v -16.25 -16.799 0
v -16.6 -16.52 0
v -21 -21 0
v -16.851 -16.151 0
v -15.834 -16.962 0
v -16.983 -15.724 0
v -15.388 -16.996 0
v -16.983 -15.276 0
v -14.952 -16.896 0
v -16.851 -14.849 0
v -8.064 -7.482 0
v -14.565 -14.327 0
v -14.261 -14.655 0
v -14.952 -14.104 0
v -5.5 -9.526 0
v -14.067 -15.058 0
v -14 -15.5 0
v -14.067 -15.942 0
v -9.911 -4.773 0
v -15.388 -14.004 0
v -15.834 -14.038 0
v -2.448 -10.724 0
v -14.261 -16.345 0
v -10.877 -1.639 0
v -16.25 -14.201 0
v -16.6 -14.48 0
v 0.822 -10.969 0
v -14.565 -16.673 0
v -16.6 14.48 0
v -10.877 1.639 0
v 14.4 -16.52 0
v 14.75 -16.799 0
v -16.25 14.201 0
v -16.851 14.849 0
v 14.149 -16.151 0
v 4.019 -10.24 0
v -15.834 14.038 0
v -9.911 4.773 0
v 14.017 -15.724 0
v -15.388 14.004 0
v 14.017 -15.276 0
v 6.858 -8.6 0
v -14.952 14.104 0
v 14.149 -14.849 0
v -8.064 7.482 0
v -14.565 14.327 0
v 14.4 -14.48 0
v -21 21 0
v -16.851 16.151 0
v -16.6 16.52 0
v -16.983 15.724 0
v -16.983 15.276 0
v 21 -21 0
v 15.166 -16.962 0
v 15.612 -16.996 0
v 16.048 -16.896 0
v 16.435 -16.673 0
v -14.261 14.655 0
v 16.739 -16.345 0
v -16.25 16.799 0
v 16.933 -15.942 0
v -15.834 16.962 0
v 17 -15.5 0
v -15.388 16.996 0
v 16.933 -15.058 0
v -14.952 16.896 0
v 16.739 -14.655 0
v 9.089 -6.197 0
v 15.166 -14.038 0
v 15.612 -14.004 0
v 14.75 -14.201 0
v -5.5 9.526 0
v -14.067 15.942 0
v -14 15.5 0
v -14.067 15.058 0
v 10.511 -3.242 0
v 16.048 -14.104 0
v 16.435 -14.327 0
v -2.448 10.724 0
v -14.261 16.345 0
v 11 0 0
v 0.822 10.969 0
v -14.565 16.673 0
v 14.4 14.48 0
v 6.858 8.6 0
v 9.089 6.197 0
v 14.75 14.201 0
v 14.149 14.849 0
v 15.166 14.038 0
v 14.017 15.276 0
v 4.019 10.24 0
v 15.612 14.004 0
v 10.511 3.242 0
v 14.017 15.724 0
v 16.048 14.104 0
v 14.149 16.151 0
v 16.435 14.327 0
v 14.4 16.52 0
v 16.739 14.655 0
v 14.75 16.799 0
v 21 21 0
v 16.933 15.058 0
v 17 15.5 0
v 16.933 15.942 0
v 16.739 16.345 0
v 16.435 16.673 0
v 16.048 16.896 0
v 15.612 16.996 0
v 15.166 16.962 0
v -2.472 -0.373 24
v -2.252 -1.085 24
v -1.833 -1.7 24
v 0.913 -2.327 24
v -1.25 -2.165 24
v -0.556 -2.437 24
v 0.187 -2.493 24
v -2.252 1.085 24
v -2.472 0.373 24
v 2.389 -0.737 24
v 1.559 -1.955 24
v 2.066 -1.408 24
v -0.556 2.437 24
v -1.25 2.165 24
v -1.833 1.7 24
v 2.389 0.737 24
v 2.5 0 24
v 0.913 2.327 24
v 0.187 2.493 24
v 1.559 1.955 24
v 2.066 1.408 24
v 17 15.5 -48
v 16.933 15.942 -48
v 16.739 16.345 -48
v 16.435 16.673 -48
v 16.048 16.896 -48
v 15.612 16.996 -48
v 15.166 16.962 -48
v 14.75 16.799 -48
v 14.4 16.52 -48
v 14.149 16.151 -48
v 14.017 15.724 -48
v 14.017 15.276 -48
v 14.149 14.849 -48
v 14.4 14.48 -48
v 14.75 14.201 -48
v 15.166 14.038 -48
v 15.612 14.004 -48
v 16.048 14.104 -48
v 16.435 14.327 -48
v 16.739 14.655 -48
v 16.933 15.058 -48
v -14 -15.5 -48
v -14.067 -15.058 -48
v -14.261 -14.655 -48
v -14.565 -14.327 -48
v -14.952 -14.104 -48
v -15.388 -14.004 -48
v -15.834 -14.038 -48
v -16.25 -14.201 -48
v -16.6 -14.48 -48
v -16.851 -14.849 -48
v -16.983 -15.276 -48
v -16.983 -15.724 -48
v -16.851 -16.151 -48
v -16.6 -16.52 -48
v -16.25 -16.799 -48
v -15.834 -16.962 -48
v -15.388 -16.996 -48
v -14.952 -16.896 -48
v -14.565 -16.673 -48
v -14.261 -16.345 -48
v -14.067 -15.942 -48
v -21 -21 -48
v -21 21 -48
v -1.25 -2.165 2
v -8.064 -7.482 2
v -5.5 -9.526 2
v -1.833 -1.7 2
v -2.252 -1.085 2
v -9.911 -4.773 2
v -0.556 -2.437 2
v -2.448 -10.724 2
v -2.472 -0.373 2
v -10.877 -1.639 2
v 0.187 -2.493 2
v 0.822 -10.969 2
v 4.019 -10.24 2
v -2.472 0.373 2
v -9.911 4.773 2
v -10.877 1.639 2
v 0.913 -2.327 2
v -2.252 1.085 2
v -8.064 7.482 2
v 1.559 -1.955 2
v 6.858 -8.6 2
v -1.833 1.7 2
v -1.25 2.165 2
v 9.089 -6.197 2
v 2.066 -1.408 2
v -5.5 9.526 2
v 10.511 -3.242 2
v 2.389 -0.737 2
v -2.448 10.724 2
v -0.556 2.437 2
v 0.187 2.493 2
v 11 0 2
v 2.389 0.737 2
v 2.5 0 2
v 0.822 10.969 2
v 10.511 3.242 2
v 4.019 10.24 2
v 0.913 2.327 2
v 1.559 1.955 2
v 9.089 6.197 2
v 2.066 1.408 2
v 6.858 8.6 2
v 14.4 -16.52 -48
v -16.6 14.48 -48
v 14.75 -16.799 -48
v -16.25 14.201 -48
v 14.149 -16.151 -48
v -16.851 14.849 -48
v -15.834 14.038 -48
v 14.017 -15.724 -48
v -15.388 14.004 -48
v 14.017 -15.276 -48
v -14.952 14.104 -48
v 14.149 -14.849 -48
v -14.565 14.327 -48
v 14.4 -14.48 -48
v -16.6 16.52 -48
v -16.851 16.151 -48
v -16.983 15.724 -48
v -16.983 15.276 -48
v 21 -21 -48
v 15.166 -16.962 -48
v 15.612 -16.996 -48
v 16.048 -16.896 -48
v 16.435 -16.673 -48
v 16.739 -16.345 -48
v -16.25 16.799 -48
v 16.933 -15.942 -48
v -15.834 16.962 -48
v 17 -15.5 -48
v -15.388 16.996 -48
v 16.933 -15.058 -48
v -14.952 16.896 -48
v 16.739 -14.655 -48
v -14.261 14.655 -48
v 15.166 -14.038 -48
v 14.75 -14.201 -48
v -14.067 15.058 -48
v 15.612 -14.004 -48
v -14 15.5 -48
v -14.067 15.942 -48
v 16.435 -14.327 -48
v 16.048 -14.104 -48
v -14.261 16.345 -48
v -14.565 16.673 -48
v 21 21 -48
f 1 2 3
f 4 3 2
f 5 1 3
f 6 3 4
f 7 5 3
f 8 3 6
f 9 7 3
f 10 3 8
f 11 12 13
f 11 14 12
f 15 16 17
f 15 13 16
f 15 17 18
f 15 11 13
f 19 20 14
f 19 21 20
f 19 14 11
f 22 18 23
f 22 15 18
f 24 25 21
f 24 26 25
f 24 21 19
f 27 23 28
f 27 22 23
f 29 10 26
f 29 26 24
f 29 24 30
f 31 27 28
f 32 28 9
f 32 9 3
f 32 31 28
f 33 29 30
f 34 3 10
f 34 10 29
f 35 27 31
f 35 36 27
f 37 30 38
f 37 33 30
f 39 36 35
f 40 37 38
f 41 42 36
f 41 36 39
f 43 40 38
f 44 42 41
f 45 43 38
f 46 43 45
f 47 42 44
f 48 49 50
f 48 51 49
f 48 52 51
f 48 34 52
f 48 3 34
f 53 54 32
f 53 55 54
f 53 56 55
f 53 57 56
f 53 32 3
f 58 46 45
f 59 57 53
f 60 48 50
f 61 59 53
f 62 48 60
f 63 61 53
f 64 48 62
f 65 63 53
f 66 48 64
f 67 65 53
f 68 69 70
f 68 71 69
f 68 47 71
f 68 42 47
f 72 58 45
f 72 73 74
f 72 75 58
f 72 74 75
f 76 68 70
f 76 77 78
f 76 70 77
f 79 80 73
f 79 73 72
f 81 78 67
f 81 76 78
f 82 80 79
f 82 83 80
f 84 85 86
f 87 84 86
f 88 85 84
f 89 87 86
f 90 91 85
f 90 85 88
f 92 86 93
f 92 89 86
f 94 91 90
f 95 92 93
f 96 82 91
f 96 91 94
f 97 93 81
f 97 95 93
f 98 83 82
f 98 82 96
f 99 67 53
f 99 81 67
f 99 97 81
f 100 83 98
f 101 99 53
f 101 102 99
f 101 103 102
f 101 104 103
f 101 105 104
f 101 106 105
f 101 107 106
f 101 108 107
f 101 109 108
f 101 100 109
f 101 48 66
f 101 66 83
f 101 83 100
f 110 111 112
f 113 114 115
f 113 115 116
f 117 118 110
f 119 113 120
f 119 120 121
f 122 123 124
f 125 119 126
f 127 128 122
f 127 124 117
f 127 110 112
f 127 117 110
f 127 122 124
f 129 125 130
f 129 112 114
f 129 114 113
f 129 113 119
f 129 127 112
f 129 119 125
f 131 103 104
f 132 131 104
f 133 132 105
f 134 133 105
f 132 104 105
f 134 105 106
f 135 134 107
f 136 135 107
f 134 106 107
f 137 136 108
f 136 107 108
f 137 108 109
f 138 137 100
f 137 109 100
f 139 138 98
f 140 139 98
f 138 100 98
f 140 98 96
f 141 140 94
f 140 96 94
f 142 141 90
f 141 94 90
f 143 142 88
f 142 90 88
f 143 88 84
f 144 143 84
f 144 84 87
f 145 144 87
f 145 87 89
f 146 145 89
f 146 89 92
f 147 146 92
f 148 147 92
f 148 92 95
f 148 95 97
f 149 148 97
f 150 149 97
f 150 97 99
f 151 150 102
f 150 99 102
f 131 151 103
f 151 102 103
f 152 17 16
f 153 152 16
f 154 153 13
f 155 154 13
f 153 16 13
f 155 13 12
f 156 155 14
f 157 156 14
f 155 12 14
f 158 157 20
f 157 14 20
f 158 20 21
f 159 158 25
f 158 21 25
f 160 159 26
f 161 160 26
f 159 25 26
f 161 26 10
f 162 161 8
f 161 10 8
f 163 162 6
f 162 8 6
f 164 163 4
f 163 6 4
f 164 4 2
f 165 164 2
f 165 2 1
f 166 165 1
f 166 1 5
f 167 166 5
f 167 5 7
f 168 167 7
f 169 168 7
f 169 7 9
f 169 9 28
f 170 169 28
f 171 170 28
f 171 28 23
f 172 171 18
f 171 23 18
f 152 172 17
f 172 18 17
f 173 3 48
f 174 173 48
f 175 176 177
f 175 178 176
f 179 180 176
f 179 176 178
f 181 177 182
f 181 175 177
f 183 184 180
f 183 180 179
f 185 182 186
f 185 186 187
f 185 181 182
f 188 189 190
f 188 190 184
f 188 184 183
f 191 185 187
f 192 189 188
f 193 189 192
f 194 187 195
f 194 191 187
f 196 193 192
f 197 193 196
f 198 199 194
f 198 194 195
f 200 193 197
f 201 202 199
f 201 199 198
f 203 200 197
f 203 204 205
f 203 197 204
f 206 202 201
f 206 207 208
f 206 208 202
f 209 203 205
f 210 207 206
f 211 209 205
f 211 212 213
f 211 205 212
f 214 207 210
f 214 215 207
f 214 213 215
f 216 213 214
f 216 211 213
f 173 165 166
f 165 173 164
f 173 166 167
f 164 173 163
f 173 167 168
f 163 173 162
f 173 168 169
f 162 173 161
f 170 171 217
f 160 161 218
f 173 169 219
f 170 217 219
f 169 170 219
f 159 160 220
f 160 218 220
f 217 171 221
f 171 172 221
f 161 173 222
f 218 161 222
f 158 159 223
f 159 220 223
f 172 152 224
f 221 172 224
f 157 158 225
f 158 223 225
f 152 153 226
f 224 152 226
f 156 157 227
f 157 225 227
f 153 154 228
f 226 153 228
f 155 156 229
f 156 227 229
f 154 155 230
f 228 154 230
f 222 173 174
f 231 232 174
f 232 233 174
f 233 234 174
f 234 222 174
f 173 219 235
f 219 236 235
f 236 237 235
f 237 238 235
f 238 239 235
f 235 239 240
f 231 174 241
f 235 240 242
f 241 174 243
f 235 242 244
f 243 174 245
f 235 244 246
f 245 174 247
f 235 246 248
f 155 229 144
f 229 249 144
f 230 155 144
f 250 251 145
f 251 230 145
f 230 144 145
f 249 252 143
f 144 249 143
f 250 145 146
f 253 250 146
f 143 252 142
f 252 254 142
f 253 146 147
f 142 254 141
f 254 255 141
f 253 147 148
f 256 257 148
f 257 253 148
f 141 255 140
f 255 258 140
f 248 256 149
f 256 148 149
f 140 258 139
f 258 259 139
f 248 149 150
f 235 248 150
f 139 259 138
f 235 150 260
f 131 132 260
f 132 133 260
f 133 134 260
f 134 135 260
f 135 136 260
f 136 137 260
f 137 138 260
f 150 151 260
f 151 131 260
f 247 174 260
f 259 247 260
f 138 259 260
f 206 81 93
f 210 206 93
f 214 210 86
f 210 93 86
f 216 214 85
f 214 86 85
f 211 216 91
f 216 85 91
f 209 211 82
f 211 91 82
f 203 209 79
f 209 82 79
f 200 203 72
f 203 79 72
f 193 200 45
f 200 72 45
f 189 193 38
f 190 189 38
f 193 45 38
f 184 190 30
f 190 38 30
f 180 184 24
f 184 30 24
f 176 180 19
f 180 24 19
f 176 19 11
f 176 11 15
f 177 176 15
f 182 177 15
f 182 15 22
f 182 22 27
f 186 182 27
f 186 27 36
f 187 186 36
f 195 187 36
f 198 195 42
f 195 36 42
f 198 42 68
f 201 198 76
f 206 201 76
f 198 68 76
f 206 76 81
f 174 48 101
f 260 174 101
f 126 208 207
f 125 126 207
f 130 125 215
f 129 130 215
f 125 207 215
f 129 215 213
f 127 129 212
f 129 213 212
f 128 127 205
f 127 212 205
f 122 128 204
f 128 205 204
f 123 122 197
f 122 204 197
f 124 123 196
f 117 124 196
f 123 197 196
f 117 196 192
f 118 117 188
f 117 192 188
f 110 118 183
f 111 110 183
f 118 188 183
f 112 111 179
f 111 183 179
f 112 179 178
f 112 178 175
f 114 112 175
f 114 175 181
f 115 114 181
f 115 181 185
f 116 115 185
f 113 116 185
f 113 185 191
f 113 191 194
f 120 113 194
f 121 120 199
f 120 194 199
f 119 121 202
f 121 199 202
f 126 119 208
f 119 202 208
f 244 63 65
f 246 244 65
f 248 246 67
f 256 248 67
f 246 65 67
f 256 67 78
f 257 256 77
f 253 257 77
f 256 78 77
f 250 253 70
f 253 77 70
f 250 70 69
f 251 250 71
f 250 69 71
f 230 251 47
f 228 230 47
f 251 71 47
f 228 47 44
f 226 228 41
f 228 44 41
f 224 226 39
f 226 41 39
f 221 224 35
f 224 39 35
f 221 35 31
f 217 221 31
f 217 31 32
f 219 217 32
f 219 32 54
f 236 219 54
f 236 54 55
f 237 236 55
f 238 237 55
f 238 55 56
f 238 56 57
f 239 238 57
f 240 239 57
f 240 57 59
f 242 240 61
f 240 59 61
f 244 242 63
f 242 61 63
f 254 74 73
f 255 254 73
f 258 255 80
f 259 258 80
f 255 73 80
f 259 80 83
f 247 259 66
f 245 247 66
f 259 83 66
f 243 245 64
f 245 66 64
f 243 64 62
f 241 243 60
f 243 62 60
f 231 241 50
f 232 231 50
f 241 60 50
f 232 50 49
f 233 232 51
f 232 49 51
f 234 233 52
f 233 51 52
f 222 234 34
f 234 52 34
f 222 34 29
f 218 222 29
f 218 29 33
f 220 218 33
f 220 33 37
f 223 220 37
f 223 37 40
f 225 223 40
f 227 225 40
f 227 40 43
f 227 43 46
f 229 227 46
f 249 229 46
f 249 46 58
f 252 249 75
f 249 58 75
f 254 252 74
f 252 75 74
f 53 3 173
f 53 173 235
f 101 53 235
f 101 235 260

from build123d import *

# Parameters (mm, degrees)
F0_W     = 42
F0_H     = 42
F0_R     = 1.5
F0_R_2   = 11
F1_DEPTH = 48
F2_DEPTH = 2
F3_R     = 2.5
F4_DEPTH = 22


with BuildPart() as f1:
    # F0 (on Top) → F1 (new body)
    with BuildSketch(Plane.XY):
        Rectangle(F0_W, F0_H)
        with Locations((-15.5, -15.5)):
            Circle(F0_R, mode=Mode.SUBTRACT)
        with Locations((15.5, -15.5)):
            Circle(F0_R, mode=Mode.SUBTRACT)
        with Locations((-15.5, 15.5)):
            Circle(F0_R, mode=Mode.SUBTRACT)
        Circle(F0_R_2, mode=Mode.SUBTRACT)
        with Locations((15.5, 15.5)):
            Circle(F0_R, mode=Mode.SUBTRACT)
        Circle(F0_R_2)
    extrude(amount=-F1_DEPTH)

    # F0 (on Top) → F2 (join)
    with BuildSketch(Plane.XY):
        Circle(F0_R_2)
    extrude(amount=F2_DEPTH)

    # F3 (on face) → F4 (join)
    with BuildSketch(Plane.XY.offset(2)):
        Circle(F3_R)
    extrude(amount=F4_DEPTH)


solid = f1.part
